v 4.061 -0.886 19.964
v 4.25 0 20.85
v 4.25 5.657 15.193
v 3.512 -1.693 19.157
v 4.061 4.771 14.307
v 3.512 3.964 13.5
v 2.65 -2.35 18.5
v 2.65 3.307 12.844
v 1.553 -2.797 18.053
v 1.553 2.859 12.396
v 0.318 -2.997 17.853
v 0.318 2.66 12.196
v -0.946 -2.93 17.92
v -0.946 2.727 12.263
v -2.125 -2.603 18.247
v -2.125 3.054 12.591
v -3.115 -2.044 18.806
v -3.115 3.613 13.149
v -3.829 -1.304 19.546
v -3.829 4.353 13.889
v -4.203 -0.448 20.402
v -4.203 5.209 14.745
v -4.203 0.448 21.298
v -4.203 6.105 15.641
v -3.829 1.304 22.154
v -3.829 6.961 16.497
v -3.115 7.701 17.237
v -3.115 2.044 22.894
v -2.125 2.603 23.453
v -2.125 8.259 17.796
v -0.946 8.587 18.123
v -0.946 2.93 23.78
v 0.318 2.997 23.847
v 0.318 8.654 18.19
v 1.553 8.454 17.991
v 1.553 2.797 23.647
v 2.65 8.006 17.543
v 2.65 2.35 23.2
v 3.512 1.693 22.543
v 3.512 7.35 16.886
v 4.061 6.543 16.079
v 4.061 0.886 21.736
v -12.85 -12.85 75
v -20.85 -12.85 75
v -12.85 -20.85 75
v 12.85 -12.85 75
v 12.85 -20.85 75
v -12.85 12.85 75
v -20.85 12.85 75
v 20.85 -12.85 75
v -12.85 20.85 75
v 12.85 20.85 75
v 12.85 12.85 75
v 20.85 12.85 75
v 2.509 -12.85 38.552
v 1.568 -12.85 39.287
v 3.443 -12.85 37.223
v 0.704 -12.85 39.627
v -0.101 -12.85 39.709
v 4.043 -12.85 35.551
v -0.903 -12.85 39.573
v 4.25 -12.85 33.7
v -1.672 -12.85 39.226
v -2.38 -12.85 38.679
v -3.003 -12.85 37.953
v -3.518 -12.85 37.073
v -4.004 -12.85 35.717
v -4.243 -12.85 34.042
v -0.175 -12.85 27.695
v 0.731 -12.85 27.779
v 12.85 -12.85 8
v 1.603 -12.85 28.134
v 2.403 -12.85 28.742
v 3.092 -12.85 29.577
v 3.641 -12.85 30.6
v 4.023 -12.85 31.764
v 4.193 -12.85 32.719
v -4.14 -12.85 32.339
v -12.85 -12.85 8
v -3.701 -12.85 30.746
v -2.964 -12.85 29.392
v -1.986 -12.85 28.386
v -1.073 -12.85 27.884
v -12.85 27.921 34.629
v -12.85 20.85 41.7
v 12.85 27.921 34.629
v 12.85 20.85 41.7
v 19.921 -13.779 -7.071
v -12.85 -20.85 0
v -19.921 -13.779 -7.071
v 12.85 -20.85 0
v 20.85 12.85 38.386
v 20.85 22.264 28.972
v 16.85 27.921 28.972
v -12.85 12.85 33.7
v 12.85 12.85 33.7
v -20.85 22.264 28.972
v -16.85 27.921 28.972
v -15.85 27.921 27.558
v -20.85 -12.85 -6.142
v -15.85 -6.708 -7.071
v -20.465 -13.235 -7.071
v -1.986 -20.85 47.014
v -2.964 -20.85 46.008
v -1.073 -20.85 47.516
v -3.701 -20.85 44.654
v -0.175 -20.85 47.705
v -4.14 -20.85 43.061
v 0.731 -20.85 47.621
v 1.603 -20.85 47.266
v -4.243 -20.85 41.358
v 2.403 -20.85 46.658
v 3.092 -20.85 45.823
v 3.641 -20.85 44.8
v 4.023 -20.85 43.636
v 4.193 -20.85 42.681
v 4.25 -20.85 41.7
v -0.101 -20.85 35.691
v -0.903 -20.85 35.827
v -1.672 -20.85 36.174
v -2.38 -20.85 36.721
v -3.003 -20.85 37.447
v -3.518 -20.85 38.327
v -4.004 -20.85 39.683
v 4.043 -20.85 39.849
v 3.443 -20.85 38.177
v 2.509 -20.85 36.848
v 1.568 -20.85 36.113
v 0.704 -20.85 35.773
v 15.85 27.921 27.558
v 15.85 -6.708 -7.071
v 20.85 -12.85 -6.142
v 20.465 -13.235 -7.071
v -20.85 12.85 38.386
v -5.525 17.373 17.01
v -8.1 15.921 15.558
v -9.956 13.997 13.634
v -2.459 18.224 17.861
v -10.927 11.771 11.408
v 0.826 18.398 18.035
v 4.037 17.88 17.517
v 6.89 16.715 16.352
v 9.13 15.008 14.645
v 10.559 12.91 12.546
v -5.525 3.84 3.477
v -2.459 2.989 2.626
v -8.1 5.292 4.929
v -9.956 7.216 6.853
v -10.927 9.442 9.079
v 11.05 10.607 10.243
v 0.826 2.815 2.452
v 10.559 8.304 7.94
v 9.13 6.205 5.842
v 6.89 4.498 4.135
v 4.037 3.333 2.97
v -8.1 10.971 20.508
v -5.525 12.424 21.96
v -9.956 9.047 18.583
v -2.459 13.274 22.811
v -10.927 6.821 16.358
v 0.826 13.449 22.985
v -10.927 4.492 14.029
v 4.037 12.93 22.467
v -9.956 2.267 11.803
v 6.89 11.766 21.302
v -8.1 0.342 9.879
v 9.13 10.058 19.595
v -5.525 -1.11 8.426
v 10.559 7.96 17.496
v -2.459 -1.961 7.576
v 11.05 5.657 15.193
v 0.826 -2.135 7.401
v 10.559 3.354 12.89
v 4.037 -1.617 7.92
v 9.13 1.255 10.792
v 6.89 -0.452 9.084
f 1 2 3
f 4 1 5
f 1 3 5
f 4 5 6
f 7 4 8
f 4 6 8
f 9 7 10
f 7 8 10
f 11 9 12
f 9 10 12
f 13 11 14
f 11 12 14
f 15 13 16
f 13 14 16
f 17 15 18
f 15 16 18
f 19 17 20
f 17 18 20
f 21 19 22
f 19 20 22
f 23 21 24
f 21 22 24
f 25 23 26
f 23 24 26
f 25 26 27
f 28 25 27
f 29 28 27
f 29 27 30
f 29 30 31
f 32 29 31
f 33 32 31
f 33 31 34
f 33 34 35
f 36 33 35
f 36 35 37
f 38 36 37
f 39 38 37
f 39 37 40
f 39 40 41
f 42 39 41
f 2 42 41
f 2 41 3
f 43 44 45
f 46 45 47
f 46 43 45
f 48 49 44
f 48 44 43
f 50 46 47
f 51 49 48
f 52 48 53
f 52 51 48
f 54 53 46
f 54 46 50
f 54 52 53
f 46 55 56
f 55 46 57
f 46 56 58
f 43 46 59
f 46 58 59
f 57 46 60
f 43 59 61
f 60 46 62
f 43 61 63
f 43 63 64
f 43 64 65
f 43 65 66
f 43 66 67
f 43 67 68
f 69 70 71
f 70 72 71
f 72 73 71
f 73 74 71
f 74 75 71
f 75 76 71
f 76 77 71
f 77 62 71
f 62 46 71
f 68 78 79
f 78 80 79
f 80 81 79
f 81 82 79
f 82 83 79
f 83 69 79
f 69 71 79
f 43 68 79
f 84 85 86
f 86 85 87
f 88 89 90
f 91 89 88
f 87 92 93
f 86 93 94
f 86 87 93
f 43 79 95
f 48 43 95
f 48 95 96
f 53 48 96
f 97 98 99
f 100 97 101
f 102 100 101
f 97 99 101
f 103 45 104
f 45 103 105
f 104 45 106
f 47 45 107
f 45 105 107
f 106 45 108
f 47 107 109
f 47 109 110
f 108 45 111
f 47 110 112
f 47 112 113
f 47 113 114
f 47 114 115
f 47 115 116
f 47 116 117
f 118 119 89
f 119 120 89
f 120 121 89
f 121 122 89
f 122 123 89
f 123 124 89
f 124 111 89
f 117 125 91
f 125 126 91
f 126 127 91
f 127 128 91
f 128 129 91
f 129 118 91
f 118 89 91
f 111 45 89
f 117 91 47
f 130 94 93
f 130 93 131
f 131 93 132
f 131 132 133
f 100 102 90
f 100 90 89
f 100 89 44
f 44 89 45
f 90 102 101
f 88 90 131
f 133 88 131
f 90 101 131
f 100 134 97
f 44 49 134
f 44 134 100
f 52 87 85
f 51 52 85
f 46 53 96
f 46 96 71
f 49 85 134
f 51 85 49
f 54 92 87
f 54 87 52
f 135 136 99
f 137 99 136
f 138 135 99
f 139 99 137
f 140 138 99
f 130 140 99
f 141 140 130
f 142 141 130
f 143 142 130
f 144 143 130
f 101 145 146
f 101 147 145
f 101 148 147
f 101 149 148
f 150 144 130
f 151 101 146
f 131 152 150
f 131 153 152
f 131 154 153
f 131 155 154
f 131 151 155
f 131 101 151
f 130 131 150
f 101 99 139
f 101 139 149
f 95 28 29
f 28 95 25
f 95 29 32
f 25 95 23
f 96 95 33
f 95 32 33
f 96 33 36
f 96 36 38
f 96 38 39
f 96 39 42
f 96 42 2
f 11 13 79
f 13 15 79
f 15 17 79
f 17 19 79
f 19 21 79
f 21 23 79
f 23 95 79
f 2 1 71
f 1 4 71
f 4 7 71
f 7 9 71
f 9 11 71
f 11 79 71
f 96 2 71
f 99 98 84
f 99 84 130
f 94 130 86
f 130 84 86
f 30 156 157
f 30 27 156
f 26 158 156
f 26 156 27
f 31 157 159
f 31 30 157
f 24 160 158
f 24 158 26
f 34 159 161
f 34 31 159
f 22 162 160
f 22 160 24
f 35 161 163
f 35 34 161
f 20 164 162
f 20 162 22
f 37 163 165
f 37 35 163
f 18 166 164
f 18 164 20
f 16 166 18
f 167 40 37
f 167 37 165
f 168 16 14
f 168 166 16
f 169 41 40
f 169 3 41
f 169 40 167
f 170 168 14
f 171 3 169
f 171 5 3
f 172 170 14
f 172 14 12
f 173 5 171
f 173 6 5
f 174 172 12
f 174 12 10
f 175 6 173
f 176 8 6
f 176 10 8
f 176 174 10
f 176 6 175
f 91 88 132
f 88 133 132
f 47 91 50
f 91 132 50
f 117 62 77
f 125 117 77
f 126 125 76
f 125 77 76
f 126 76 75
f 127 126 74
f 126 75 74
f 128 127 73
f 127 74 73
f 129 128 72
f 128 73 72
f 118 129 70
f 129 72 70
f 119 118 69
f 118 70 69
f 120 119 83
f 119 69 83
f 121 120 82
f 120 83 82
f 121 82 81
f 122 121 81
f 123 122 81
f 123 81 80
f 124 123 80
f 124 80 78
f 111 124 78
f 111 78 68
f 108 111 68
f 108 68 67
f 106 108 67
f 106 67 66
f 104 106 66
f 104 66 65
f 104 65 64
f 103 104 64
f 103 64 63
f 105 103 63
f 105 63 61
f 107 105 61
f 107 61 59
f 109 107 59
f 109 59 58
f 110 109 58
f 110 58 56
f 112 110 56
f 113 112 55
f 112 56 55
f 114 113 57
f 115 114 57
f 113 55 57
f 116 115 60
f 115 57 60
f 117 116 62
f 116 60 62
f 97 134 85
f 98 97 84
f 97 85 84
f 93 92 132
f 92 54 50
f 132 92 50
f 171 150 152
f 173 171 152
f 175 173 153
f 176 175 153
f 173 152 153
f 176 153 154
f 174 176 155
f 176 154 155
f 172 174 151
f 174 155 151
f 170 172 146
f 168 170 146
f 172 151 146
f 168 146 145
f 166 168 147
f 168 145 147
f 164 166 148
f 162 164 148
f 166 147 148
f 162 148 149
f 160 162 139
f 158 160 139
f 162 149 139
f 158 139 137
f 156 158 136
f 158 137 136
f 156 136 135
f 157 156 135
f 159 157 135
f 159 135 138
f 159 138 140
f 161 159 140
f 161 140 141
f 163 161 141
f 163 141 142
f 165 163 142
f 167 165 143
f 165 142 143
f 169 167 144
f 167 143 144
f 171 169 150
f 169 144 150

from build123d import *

# Parameters (mm, degrees)
F1_DEPTH    = 75
F3_DEPTH    = 41.701
F4_W        = 41.7
F4_H        = 58.972705551
F5_DEPTH    = 15
F6_R        = 11.05
F7_DEPTH    = 7
F8_R        = 4.25
F9_DEPTH    = 61.034008589
F10_SIZE    = 8
F12_C1_SIZE = 5
F12_C2_SIZE = 5
F12_C3_SIZE = 5
F12_C4_SIZE = 5
F13_SIZE    = 8


with BuildPart() as f1:
    # F0 (on Top) → F1 (new body)
    with BuildSketch(Plane.XY):
        Polygon((20.85, 20.85), (0, 20.85), (-20.85, 20.85), (-20.85, 0), (-20.85, -20.85), (0, -20.85), (20.85, -20.85), (20.85, 0), align=None)
        Polygon((-12.85, 12.85), (0, 12.85), (12.85, 12.85), (12.85, 0), (12.85, -12.85), (0, -12.85), (-12.85, -12.85), (-12.85, 0), align=None, mode=Mode.SUBTRACT)
    extrude(amount=F1_DEPTH)

    # F2 (on face) → F3 (cut, through all)
    with BuildSketch(Plane(origin=(-20.85, 0, 0), x_dir=(0, -1, 0), z_dir=(-1, 0, 0))):
        Polygon((-20.85, 0), (20.85, 0), (-20.85, 41.7), align=None)
    extrude(amount=-F3_DEPTH, mode=Mode.SUBTRACT)

    # F4 (on face) → F5 (join)
    with BuildSketch(Plane(origin=(0, -10.425, 10.425), x_dir=(1, 0, 0), z_dir=(0, 0.7071067812, -0.7071067812))):
        with Locations((0, -14.7431763877)):
            Rectangle(F4_W, F4_H)
    extrude(amount=F5_DEPTH)

    # F6 (on face) → F7 (cut)
    with BuildSketch(Plane(origin=(0, 0.1816017178, -0.1816017178), x_dir=(1, 0, 0), z_dir=(0, 0.7071067812, -0.7071067812))):
        with Locations((0, -14.7431763877)):
            Circle(F6_R)
    extrude(amount=-F7_DEPTH, mode=Mode.SUBTRACT)

    # F8 (on face) → F9 (cut, through all)
    with BuildSketch(Plane(origin=(0, -4.7681457505, 4.7681457505), x_dir=(1, 0, 0), z_dir=(0, 0.7071067812, -0.7071067812))):
        with Locations((0, -14.7431763877)):
            Circle(F8_R)
    extrude(amount=-F9_DEPTH, mode=Mode.SUBTRACT)

    # F10
    f10_edges = [f1.edges().sort_by_distance(p)[0] for p in [
        (-20.85, -20.85, 37.5),
        (20.85, -20.85, 37.5),
        (20.85, 20.85, 58.35),
        (-20.85, 20.85, 58.35),
    ]]
    chamfer(f10_edges, length=F10_SIZE)

    # F12: chamfer of 5 on 4 edges, made by hand

    # F12_c1
    f12_c1_edges = [f1.edges().sort_by_distance(p)[0] for p in [
        (0, 31.4566017178, 31.0933982822),
    ]]
    chamfer(f12_c1_edges, length=F12_C1_SIZE)

    # F12_c2
    f12_c2_edges = [f1.edges().sort_by_distance(p)[0] for p in [
        (-20.85, 8.8388347648, 8.4756313292),
    ]]
    chamfer(f12_c2_edges, length=F12_C2_SIZE)

    # F12_c3
    f12_c3_edges = [f1.edges().sort_by_distance(p)[0] for p in [
        (20.85, 8.8388347648, 8.4756313292),
    ]]
    chamfer(f12_c3_edges, length=F12_C3_SIZE)

    # F12_c4
    f12_c4_edges = [f1.edges().sort_by_distance(p)[0] for p in [
        (0, -10.2433982822, -10.6066017178),
    ]]
    chamfer(f12_c4_edges, length=F12_C4_SIZE)

    # F13
    f13_edges = [f1.edges().sort_by_distance(p)[0] for p in [
        (20.85, 24.385534, 38.164466),
        (-20.85, 24.385534, 38.164466),
    ]]
    chamfer(f13_edges, length=F13_SIZE)


solid = f1.part
